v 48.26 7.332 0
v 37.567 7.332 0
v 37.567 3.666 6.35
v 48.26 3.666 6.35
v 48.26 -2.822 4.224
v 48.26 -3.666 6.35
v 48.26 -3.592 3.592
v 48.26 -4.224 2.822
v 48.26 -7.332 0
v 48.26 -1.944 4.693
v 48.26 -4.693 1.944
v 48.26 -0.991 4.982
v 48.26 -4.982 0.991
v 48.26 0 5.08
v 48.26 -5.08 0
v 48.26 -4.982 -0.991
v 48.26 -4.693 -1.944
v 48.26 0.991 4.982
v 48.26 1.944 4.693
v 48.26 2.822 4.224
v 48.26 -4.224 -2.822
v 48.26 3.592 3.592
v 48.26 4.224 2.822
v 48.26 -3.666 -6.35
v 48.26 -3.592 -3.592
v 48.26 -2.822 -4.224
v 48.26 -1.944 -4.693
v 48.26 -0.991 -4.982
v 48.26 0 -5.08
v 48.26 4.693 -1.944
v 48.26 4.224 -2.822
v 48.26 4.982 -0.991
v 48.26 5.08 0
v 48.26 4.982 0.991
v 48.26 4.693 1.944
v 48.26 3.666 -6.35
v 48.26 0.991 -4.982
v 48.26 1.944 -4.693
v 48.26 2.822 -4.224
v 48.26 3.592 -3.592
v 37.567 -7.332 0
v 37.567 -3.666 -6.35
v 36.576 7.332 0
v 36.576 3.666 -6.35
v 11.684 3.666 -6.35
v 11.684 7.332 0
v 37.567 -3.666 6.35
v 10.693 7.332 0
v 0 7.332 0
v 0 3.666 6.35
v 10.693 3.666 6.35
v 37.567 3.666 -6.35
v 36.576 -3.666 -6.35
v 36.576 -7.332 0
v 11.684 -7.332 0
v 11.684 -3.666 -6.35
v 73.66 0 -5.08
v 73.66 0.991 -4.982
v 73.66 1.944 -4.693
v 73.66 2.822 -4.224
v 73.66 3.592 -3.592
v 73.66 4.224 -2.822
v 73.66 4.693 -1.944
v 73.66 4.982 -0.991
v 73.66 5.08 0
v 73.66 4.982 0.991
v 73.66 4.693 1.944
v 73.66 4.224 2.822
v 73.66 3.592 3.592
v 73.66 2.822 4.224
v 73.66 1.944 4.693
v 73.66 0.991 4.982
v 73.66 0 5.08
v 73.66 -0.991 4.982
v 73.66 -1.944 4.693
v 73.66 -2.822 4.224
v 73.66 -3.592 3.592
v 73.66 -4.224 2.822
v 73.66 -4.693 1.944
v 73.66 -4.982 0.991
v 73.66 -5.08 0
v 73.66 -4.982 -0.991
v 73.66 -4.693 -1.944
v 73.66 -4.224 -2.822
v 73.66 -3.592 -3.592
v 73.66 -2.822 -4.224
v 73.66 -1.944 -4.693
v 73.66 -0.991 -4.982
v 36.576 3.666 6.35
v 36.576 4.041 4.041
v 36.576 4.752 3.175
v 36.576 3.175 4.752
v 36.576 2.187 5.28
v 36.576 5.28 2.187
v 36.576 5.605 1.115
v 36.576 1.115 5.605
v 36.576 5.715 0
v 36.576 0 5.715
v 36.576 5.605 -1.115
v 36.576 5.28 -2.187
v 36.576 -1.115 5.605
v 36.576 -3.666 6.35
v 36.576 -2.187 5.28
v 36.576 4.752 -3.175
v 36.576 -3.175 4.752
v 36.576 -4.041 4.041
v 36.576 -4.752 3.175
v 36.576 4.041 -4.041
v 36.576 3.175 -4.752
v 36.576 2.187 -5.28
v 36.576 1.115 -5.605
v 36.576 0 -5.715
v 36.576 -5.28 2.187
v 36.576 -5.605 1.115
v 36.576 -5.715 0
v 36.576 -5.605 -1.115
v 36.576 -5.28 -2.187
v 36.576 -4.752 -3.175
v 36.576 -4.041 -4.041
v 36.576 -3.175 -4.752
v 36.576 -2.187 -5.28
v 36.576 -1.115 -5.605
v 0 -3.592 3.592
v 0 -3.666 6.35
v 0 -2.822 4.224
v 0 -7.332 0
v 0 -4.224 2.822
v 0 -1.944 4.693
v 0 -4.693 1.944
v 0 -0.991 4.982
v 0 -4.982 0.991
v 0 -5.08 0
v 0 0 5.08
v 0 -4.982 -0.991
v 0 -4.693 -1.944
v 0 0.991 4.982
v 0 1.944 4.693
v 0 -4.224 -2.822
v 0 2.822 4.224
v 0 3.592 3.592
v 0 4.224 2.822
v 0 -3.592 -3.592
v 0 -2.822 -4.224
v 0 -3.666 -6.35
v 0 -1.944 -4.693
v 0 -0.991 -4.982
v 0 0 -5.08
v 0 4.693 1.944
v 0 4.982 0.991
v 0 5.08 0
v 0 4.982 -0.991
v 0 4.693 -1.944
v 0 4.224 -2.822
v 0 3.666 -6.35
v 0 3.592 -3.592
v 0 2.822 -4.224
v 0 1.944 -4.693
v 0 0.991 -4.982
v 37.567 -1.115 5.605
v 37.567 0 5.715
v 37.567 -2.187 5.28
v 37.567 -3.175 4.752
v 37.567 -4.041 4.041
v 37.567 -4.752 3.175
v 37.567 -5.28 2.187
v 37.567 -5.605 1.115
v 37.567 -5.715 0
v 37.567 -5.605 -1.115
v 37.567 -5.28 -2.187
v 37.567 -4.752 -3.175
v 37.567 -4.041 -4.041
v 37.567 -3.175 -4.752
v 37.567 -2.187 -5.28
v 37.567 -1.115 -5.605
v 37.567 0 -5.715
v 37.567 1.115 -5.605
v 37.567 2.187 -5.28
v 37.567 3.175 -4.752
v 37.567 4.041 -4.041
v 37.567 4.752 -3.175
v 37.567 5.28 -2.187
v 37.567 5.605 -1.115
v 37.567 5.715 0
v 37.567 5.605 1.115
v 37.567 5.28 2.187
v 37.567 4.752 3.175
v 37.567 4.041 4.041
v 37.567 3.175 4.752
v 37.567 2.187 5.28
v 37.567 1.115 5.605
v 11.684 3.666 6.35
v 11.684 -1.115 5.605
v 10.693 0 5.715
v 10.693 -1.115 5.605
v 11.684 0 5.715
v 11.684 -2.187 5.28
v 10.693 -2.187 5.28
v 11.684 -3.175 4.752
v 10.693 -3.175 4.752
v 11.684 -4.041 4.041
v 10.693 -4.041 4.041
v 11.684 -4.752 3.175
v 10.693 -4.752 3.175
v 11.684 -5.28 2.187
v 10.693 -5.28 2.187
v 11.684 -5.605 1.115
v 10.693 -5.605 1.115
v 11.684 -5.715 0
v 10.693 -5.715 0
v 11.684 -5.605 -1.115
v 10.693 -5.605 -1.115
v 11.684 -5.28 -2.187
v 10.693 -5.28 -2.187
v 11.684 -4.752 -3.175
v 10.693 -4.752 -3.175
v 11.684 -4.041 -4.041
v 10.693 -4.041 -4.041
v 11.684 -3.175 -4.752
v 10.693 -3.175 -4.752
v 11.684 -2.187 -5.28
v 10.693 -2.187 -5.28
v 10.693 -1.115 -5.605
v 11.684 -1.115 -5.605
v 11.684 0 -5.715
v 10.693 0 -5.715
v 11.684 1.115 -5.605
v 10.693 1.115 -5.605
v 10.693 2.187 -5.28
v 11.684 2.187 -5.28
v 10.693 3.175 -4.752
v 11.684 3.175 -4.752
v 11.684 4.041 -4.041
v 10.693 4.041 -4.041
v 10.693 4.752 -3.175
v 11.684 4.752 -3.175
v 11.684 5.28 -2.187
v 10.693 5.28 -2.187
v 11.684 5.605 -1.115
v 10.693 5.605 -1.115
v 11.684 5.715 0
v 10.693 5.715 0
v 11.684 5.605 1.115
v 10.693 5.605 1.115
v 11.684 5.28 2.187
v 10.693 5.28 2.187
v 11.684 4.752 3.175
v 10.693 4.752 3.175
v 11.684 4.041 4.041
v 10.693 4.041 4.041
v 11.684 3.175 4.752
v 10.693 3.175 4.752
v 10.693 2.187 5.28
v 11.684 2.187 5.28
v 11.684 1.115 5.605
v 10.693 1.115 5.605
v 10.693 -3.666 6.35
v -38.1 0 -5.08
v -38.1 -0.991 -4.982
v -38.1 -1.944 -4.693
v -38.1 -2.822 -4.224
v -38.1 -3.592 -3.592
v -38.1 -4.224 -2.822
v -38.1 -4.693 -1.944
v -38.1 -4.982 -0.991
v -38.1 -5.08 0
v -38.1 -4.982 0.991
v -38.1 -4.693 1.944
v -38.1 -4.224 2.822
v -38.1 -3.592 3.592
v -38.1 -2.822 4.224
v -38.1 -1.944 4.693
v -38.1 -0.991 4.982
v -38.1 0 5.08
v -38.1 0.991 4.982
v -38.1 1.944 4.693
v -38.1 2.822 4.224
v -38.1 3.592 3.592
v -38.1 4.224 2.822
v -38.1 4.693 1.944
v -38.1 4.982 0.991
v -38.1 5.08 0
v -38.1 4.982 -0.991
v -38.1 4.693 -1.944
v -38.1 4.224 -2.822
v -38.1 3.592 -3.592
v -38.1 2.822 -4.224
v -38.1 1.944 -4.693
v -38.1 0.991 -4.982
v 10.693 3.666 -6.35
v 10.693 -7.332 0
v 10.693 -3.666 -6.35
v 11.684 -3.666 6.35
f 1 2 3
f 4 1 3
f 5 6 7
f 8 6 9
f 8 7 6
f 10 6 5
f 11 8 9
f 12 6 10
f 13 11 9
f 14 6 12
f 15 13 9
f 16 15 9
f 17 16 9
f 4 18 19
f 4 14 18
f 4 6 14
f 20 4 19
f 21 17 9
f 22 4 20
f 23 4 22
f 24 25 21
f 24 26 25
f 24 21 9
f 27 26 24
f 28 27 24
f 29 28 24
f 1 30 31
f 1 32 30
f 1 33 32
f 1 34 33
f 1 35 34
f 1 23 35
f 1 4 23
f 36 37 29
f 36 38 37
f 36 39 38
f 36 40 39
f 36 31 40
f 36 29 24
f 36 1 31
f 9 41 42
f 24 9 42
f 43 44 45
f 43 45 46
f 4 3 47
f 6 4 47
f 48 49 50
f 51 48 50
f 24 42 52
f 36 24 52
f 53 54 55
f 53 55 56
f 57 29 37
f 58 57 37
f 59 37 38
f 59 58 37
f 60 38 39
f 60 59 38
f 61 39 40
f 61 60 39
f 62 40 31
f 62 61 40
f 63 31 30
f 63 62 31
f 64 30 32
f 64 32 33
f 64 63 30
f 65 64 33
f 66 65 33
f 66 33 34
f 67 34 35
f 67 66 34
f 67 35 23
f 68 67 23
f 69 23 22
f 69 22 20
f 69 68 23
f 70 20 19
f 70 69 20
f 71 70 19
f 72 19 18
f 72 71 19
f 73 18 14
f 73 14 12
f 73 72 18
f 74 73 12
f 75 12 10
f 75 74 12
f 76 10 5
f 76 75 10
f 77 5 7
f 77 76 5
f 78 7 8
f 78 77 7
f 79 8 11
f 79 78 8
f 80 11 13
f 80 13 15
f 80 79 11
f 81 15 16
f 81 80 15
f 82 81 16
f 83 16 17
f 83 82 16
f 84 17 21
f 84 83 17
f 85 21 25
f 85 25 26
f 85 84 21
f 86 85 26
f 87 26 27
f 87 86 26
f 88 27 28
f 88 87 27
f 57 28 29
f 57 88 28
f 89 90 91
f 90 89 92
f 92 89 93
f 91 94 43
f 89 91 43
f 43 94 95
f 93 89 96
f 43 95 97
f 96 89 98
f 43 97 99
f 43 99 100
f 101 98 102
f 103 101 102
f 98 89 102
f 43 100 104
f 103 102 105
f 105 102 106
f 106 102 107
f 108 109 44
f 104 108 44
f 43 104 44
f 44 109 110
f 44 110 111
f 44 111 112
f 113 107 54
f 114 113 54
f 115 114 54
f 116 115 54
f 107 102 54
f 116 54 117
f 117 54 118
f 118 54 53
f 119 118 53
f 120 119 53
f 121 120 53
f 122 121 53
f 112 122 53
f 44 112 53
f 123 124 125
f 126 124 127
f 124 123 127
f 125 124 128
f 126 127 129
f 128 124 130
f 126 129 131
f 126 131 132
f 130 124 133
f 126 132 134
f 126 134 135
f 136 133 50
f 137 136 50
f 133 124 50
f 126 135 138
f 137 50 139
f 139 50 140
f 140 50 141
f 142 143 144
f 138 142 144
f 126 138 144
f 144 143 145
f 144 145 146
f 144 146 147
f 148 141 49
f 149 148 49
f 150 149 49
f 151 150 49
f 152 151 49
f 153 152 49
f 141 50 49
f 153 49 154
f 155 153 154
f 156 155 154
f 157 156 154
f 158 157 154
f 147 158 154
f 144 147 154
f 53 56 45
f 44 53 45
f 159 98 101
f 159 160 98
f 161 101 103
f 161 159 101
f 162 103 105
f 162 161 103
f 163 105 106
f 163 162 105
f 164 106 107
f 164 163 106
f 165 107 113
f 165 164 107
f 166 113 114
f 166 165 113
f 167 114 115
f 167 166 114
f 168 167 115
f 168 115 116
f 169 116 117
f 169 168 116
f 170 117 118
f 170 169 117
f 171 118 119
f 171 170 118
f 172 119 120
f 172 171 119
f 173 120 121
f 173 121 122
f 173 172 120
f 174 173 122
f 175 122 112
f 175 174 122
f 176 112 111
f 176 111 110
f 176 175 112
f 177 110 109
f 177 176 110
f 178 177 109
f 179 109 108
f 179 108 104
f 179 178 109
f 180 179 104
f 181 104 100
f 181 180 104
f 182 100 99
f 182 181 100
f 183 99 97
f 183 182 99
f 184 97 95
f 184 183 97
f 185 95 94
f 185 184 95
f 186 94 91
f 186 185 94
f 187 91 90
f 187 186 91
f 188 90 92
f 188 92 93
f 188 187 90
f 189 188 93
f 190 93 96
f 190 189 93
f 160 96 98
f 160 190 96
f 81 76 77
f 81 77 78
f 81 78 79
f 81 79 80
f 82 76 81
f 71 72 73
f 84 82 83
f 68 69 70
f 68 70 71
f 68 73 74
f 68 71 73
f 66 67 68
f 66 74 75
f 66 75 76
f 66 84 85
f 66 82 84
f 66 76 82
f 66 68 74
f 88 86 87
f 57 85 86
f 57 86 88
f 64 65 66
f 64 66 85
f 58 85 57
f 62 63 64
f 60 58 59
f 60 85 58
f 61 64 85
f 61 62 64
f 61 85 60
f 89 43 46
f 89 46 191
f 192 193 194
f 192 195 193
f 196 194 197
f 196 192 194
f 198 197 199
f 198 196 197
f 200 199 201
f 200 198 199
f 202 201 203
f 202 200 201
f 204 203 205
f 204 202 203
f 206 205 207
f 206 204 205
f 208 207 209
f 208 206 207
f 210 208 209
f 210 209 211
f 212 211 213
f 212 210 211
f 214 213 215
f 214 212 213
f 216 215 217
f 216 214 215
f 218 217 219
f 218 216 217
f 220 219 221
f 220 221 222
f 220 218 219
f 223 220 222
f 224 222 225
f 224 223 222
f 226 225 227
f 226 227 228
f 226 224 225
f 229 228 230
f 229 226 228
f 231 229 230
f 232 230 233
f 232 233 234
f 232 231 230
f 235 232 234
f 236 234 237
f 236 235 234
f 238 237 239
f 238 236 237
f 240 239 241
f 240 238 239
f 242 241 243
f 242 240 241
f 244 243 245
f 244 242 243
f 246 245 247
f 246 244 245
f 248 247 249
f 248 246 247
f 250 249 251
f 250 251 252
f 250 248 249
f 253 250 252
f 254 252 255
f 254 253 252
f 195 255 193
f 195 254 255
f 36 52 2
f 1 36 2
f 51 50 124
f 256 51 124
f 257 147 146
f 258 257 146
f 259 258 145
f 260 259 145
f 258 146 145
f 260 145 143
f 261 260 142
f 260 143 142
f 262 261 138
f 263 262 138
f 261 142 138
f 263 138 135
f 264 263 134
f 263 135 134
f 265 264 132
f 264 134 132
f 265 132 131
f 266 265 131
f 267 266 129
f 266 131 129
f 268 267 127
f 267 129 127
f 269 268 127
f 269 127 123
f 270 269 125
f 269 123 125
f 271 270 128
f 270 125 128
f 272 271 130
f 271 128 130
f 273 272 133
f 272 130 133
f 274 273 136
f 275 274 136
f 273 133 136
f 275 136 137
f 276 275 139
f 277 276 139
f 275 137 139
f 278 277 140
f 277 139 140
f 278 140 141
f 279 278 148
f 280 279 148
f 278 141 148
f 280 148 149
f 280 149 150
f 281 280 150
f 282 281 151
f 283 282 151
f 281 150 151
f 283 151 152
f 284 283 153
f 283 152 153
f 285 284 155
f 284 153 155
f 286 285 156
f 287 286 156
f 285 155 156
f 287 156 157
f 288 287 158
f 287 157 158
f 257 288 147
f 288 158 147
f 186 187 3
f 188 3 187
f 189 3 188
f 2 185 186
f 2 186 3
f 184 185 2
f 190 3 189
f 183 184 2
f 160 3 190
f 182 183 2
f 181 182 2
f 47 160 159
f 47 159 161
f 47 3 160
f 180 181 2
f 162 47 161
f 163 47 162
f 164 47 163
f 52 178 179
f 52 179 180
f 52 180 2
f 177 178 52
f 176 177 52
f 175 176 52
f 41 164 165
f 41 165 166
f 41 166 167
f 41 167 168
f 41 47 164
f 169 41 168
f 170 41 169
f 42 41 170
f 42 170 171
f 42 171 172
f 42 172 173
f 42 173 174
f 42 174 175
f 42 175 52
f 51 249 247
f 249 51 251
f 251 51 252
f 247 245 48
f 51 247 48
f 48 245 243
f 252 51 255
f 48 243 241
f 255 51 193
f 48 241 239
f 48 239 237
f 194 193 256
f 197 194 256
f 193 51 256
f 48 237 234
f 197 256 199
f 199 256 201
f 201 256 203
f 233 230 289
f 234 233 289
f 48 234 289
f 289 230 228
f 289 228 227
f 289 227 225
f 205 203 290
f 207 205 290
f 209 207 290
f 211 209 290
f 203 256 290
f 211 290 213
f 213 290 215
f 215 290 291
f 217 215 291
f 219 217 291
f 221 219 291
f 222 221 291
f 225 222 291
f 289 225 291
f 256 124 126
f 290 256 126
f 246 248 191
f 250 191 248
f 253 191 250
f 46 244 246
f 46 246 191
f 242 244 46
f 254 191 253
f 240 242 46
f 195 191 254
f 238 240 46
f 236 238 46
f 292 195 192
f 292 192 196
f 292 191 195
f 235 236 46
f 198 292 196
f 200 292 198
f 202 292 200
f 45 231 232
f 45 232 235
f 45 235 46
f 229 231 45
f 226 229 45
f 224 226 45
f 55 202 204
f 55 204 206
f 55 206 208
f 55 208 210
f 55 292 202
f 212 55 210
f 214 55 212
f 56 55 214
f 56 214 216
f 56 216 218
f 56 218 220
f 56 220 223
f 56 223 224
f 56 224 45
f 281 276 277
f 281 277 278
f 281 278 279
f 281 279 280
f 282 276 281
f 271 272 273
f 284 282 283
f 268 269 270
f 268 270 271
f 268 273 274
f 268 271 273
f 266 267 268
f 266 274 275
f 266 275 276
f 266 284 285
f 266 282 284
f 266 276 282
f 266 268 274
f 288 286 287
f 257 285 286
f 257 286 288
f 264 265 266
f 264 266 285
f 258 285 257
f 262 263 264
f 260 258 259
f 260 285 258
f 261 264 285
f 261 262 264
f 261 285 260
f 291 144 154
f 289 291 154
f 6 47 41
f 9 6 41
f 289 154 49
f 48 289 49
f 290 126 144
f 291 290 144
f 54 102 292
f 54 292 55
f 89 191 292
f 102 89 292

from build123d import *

# Parameters (mm, degrees)
BOSS_EXTRUDE1_DEPTH = 48.26
SKETCH4_R           = 5.08
BOSS_EXTRUDE2_DEPTH = 38.1
BOSS_EXTRUDE3_START = 25.4
SKETCH5_R           = 5.08
BOSS_EXTRUDE3_DEPTH = 25.4
SKETCH3_W           = 0.9906
SKETCH3_H           = 2.218819971


with BuildPart() as part:
    # Sketch1 → Boss-Extrude1 (new body)
    with BuildSketch(Plane(origin=(0, 0, 0), x_dir=(0, 0, -1), z_dir=(1, 0, 0))):
        Polygon((0, -7.332348419), (6.35, -3.666174209), (6.35, 3.666174209), (0, 7.332348419), (-6.35, 3.666174209), (-6.35, -3.666174209), align=None)
    extrude(amount=BOSS_EXTRUDE1_DEPTH)

    # Sketch4 → Boss-Extrude2 (add)
    with BuildSketch(Plane.ZY):
        with Locations(Location((0, 0, 0), (0, 0, 180))):
            Circle(SKETCH4_R)
    extrude(amount=BOSS_EXTRUDE2_DEPTH)

    # Sketch5 → Boss-Extrude3 (add)
    with BuildSketch(Plane(origin=(48.26, 0, 0), x_dir=(0, 0, -1), z_dir=(1, 0, 0)).offset(BOSS_EXTRUDE3_START)):
        Circle(SKETCH5_R)
    extrude(amount=-BOSS_EXTRUDE3_DEPTH)

    # Sketch3 → Cut-Revolve2 (revolve, cut)
    with BuildSketch(Plane(origin=(0, 0, 0), x_dir=(1, 0, 0), z_dir=(0, 1, 0)), mode=Mode.PRIVATE) as cut_revolve2_sk:
        with Locations((37.0713, 6.824409986)):
            Rectangle(SKETCH3_W, SKETCH3_H)
        with Locations((11.1887, 6.824409986)):
            Rectangle(SKETCH3_W, SKETCH3_H)
    revolve(cut_revolve2_sk.sketch.rotate(Axis((-57.594560376, 0, 0), (1, 0, 0)), 180), axis=Axis((-57.594560376, 0, 0), (1, 0, 0)), mode=Mode.SUBTRACT)


solid = part.part
